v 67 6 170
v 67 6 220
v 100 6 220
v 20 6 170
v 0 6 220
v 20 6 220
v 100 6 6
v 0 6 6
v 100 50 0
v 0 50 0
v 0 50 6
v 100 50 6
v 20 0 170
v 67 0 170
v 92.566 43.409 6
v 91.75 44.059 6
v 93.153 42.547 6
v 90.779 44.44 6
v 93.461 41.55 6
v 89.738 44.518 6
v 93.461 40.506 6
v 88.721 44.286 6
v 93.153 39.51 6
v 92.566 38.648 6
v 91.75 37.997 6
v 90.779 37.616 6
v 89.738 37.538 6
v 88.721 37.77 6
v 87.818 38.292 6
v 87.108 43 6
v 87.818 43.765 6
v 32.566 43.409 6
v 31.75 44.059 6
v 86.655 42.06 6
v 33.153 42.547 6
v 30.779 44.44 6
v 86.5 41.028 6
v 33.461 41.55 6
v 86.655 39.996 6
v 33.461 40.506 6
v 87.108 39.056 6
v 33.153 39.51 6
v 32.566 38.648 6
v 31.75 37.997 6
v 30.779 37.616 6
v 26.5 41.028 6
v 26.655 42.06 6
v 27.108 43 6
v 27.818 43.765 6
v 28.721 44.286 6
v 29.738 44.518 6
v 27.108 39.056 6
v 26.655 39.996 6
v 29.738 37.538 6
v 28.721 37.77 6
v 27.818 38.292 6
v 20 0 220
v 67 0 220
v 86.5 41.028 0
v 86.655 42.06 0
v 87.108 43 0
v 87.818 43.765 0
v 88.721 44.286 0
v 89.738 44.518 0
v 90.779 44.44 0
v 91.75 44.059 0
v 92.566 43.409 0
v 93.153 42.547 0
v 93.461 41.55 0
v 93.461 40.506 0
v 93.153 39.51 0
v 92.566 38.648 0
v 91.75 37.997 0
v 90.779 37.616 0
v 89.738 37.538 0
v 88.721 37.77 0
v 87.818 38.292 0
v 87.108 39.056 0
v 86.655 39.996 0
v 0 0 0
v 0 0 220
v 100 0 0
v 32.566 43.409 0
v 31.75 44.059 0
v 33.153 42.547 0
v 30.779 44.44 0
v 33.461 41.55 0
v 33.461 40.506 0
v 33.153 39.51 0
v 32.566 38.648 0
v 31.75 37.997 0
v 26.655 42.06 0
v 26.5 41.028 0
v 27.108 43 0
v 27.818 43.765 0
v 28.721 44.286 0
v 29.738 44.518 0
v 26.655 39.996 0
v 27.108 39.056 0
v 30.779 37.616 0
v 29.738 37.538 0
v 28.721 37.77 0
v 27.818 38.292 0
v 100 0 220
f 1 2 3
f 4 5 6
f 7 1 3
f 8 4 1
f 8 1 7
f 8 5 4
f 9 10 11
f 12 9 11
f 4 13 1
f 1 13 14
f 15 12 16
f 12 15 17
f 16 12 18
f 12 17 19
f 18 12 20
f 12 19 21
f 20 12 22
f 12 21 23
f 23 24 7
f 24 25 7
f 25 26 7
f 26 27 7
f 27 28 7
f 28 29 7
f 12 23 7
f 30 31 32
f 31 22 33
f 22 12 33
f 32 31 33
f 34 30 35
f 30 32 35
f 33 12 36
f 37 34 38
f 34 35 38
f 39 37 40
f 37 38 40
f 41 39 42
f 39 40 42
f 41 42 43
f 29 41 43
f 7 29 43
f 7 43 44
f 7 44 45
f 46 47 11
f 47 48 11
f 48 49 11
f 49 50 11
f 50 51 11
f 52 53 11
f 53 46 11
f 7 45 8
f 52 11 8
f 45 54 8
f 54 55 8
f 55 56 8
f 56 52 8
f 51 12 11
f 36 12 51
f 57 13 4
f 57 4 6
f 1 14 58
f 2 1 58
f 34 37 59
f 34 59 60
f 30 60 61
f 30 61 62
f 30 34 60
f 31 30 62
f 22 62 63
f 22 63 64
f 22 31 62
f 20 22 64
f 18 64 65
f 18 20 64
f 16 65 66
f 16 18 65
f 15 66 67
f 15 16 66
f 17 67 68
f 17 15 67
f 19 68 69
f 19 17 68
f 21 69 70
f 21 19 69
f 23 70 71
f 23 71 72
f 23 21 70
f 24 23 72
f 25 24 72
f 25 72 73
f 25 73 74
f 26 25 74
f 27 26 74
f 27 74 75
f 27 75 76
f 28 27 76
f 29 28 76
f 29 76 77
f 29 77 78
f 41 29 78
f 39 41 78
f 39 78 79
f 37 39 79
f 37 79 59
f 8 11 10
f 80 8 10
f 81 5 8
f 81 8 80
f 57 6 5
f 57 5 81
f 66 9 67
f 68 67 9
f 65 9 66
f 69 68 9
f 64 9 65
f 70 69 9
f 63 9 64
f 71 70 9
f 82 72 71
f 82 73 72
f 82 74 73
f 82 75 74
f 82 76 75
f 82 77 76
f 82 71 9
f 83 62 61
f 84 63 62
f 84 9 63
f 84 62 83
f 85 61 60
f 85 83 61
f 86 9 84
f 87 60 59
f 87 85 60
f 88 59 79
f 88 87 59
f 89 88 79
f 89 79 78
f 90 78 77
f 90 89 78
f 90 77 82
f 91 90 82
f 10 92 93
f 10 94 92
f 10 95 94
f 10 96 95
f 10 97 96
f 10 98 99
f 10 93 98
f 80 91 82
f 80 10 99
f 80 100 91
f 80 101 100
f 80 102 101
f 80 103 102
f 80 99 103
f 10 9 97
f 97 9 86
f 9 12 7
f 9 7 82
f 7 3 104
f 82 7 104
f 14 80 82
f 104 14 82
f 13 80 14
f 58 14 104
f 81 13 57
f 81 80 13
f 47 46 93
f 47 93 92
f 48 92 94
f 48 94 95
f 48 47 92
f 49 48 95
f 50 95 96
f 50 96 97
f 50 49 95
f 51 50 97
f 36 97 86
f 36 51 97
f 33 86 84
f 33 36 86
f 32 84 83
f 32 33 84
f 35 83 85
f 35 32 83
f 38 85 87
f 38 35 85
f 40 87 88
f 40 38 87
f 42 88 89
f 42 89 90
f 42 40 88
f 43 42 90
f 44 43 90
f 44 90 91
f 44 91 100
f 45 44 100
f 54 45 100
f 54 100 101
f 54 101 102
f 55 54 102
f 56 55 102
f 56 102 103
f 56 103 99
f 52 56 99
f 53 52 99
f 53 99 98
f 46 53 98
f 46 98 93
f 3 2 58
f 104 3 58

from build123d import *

# Parameters (mm, degrees)
F0_W     = 6
F0_H     = 214
F0_H_2   = 6
F0_W_2   = 44
F1_DEPTH = 100
F3_D     = 7
F4_W     = 47
F4_H     = 50
F5_DEPTH = 25


with BuildPart() as f1:
    # F0 (on Right) → F1 (new body)
    with BuildSketch(Plane.YZ):
        with Locations((-3, 113)):
            Rectangle(F0_W, F0_H)
        with Locations((-3, 3)):
            Rectangle(F0_W, F0_H_2)
        with Locations((-28, 3)):
            Rectangle(F0_W_2, F0_H_2)
    extrude(amount=F1_DEPTH)

    # F3 (through all)
    with Locations(Plane(origin=(0, 0, 0), x_dir=(1, 0, 0), z_dir=(0, 0, -1))):
        with Locations((30, 41.0281047225), (90, 41.0281047225)):
            Hole(F3_D / 2)

    # F4 (on Front) → F5 (cut)
    with BuildSketch(Plane.XZ):
        with Locations((43.5, 195)):
            Rectangle(F4_W, F4_H)
    extrude(amount=F5_DEPTH, mode=Mode.SUBTRACT)


with BuildPart() as f6_1:
    # F6: instance of F1
    add(f1.part.mirror(Plane.XZ))


with BuildPart() as f8_1:
    # F8: instance of F1
    add(f1.part.mirror(Plane.XZ))


solid = f8_1.part
